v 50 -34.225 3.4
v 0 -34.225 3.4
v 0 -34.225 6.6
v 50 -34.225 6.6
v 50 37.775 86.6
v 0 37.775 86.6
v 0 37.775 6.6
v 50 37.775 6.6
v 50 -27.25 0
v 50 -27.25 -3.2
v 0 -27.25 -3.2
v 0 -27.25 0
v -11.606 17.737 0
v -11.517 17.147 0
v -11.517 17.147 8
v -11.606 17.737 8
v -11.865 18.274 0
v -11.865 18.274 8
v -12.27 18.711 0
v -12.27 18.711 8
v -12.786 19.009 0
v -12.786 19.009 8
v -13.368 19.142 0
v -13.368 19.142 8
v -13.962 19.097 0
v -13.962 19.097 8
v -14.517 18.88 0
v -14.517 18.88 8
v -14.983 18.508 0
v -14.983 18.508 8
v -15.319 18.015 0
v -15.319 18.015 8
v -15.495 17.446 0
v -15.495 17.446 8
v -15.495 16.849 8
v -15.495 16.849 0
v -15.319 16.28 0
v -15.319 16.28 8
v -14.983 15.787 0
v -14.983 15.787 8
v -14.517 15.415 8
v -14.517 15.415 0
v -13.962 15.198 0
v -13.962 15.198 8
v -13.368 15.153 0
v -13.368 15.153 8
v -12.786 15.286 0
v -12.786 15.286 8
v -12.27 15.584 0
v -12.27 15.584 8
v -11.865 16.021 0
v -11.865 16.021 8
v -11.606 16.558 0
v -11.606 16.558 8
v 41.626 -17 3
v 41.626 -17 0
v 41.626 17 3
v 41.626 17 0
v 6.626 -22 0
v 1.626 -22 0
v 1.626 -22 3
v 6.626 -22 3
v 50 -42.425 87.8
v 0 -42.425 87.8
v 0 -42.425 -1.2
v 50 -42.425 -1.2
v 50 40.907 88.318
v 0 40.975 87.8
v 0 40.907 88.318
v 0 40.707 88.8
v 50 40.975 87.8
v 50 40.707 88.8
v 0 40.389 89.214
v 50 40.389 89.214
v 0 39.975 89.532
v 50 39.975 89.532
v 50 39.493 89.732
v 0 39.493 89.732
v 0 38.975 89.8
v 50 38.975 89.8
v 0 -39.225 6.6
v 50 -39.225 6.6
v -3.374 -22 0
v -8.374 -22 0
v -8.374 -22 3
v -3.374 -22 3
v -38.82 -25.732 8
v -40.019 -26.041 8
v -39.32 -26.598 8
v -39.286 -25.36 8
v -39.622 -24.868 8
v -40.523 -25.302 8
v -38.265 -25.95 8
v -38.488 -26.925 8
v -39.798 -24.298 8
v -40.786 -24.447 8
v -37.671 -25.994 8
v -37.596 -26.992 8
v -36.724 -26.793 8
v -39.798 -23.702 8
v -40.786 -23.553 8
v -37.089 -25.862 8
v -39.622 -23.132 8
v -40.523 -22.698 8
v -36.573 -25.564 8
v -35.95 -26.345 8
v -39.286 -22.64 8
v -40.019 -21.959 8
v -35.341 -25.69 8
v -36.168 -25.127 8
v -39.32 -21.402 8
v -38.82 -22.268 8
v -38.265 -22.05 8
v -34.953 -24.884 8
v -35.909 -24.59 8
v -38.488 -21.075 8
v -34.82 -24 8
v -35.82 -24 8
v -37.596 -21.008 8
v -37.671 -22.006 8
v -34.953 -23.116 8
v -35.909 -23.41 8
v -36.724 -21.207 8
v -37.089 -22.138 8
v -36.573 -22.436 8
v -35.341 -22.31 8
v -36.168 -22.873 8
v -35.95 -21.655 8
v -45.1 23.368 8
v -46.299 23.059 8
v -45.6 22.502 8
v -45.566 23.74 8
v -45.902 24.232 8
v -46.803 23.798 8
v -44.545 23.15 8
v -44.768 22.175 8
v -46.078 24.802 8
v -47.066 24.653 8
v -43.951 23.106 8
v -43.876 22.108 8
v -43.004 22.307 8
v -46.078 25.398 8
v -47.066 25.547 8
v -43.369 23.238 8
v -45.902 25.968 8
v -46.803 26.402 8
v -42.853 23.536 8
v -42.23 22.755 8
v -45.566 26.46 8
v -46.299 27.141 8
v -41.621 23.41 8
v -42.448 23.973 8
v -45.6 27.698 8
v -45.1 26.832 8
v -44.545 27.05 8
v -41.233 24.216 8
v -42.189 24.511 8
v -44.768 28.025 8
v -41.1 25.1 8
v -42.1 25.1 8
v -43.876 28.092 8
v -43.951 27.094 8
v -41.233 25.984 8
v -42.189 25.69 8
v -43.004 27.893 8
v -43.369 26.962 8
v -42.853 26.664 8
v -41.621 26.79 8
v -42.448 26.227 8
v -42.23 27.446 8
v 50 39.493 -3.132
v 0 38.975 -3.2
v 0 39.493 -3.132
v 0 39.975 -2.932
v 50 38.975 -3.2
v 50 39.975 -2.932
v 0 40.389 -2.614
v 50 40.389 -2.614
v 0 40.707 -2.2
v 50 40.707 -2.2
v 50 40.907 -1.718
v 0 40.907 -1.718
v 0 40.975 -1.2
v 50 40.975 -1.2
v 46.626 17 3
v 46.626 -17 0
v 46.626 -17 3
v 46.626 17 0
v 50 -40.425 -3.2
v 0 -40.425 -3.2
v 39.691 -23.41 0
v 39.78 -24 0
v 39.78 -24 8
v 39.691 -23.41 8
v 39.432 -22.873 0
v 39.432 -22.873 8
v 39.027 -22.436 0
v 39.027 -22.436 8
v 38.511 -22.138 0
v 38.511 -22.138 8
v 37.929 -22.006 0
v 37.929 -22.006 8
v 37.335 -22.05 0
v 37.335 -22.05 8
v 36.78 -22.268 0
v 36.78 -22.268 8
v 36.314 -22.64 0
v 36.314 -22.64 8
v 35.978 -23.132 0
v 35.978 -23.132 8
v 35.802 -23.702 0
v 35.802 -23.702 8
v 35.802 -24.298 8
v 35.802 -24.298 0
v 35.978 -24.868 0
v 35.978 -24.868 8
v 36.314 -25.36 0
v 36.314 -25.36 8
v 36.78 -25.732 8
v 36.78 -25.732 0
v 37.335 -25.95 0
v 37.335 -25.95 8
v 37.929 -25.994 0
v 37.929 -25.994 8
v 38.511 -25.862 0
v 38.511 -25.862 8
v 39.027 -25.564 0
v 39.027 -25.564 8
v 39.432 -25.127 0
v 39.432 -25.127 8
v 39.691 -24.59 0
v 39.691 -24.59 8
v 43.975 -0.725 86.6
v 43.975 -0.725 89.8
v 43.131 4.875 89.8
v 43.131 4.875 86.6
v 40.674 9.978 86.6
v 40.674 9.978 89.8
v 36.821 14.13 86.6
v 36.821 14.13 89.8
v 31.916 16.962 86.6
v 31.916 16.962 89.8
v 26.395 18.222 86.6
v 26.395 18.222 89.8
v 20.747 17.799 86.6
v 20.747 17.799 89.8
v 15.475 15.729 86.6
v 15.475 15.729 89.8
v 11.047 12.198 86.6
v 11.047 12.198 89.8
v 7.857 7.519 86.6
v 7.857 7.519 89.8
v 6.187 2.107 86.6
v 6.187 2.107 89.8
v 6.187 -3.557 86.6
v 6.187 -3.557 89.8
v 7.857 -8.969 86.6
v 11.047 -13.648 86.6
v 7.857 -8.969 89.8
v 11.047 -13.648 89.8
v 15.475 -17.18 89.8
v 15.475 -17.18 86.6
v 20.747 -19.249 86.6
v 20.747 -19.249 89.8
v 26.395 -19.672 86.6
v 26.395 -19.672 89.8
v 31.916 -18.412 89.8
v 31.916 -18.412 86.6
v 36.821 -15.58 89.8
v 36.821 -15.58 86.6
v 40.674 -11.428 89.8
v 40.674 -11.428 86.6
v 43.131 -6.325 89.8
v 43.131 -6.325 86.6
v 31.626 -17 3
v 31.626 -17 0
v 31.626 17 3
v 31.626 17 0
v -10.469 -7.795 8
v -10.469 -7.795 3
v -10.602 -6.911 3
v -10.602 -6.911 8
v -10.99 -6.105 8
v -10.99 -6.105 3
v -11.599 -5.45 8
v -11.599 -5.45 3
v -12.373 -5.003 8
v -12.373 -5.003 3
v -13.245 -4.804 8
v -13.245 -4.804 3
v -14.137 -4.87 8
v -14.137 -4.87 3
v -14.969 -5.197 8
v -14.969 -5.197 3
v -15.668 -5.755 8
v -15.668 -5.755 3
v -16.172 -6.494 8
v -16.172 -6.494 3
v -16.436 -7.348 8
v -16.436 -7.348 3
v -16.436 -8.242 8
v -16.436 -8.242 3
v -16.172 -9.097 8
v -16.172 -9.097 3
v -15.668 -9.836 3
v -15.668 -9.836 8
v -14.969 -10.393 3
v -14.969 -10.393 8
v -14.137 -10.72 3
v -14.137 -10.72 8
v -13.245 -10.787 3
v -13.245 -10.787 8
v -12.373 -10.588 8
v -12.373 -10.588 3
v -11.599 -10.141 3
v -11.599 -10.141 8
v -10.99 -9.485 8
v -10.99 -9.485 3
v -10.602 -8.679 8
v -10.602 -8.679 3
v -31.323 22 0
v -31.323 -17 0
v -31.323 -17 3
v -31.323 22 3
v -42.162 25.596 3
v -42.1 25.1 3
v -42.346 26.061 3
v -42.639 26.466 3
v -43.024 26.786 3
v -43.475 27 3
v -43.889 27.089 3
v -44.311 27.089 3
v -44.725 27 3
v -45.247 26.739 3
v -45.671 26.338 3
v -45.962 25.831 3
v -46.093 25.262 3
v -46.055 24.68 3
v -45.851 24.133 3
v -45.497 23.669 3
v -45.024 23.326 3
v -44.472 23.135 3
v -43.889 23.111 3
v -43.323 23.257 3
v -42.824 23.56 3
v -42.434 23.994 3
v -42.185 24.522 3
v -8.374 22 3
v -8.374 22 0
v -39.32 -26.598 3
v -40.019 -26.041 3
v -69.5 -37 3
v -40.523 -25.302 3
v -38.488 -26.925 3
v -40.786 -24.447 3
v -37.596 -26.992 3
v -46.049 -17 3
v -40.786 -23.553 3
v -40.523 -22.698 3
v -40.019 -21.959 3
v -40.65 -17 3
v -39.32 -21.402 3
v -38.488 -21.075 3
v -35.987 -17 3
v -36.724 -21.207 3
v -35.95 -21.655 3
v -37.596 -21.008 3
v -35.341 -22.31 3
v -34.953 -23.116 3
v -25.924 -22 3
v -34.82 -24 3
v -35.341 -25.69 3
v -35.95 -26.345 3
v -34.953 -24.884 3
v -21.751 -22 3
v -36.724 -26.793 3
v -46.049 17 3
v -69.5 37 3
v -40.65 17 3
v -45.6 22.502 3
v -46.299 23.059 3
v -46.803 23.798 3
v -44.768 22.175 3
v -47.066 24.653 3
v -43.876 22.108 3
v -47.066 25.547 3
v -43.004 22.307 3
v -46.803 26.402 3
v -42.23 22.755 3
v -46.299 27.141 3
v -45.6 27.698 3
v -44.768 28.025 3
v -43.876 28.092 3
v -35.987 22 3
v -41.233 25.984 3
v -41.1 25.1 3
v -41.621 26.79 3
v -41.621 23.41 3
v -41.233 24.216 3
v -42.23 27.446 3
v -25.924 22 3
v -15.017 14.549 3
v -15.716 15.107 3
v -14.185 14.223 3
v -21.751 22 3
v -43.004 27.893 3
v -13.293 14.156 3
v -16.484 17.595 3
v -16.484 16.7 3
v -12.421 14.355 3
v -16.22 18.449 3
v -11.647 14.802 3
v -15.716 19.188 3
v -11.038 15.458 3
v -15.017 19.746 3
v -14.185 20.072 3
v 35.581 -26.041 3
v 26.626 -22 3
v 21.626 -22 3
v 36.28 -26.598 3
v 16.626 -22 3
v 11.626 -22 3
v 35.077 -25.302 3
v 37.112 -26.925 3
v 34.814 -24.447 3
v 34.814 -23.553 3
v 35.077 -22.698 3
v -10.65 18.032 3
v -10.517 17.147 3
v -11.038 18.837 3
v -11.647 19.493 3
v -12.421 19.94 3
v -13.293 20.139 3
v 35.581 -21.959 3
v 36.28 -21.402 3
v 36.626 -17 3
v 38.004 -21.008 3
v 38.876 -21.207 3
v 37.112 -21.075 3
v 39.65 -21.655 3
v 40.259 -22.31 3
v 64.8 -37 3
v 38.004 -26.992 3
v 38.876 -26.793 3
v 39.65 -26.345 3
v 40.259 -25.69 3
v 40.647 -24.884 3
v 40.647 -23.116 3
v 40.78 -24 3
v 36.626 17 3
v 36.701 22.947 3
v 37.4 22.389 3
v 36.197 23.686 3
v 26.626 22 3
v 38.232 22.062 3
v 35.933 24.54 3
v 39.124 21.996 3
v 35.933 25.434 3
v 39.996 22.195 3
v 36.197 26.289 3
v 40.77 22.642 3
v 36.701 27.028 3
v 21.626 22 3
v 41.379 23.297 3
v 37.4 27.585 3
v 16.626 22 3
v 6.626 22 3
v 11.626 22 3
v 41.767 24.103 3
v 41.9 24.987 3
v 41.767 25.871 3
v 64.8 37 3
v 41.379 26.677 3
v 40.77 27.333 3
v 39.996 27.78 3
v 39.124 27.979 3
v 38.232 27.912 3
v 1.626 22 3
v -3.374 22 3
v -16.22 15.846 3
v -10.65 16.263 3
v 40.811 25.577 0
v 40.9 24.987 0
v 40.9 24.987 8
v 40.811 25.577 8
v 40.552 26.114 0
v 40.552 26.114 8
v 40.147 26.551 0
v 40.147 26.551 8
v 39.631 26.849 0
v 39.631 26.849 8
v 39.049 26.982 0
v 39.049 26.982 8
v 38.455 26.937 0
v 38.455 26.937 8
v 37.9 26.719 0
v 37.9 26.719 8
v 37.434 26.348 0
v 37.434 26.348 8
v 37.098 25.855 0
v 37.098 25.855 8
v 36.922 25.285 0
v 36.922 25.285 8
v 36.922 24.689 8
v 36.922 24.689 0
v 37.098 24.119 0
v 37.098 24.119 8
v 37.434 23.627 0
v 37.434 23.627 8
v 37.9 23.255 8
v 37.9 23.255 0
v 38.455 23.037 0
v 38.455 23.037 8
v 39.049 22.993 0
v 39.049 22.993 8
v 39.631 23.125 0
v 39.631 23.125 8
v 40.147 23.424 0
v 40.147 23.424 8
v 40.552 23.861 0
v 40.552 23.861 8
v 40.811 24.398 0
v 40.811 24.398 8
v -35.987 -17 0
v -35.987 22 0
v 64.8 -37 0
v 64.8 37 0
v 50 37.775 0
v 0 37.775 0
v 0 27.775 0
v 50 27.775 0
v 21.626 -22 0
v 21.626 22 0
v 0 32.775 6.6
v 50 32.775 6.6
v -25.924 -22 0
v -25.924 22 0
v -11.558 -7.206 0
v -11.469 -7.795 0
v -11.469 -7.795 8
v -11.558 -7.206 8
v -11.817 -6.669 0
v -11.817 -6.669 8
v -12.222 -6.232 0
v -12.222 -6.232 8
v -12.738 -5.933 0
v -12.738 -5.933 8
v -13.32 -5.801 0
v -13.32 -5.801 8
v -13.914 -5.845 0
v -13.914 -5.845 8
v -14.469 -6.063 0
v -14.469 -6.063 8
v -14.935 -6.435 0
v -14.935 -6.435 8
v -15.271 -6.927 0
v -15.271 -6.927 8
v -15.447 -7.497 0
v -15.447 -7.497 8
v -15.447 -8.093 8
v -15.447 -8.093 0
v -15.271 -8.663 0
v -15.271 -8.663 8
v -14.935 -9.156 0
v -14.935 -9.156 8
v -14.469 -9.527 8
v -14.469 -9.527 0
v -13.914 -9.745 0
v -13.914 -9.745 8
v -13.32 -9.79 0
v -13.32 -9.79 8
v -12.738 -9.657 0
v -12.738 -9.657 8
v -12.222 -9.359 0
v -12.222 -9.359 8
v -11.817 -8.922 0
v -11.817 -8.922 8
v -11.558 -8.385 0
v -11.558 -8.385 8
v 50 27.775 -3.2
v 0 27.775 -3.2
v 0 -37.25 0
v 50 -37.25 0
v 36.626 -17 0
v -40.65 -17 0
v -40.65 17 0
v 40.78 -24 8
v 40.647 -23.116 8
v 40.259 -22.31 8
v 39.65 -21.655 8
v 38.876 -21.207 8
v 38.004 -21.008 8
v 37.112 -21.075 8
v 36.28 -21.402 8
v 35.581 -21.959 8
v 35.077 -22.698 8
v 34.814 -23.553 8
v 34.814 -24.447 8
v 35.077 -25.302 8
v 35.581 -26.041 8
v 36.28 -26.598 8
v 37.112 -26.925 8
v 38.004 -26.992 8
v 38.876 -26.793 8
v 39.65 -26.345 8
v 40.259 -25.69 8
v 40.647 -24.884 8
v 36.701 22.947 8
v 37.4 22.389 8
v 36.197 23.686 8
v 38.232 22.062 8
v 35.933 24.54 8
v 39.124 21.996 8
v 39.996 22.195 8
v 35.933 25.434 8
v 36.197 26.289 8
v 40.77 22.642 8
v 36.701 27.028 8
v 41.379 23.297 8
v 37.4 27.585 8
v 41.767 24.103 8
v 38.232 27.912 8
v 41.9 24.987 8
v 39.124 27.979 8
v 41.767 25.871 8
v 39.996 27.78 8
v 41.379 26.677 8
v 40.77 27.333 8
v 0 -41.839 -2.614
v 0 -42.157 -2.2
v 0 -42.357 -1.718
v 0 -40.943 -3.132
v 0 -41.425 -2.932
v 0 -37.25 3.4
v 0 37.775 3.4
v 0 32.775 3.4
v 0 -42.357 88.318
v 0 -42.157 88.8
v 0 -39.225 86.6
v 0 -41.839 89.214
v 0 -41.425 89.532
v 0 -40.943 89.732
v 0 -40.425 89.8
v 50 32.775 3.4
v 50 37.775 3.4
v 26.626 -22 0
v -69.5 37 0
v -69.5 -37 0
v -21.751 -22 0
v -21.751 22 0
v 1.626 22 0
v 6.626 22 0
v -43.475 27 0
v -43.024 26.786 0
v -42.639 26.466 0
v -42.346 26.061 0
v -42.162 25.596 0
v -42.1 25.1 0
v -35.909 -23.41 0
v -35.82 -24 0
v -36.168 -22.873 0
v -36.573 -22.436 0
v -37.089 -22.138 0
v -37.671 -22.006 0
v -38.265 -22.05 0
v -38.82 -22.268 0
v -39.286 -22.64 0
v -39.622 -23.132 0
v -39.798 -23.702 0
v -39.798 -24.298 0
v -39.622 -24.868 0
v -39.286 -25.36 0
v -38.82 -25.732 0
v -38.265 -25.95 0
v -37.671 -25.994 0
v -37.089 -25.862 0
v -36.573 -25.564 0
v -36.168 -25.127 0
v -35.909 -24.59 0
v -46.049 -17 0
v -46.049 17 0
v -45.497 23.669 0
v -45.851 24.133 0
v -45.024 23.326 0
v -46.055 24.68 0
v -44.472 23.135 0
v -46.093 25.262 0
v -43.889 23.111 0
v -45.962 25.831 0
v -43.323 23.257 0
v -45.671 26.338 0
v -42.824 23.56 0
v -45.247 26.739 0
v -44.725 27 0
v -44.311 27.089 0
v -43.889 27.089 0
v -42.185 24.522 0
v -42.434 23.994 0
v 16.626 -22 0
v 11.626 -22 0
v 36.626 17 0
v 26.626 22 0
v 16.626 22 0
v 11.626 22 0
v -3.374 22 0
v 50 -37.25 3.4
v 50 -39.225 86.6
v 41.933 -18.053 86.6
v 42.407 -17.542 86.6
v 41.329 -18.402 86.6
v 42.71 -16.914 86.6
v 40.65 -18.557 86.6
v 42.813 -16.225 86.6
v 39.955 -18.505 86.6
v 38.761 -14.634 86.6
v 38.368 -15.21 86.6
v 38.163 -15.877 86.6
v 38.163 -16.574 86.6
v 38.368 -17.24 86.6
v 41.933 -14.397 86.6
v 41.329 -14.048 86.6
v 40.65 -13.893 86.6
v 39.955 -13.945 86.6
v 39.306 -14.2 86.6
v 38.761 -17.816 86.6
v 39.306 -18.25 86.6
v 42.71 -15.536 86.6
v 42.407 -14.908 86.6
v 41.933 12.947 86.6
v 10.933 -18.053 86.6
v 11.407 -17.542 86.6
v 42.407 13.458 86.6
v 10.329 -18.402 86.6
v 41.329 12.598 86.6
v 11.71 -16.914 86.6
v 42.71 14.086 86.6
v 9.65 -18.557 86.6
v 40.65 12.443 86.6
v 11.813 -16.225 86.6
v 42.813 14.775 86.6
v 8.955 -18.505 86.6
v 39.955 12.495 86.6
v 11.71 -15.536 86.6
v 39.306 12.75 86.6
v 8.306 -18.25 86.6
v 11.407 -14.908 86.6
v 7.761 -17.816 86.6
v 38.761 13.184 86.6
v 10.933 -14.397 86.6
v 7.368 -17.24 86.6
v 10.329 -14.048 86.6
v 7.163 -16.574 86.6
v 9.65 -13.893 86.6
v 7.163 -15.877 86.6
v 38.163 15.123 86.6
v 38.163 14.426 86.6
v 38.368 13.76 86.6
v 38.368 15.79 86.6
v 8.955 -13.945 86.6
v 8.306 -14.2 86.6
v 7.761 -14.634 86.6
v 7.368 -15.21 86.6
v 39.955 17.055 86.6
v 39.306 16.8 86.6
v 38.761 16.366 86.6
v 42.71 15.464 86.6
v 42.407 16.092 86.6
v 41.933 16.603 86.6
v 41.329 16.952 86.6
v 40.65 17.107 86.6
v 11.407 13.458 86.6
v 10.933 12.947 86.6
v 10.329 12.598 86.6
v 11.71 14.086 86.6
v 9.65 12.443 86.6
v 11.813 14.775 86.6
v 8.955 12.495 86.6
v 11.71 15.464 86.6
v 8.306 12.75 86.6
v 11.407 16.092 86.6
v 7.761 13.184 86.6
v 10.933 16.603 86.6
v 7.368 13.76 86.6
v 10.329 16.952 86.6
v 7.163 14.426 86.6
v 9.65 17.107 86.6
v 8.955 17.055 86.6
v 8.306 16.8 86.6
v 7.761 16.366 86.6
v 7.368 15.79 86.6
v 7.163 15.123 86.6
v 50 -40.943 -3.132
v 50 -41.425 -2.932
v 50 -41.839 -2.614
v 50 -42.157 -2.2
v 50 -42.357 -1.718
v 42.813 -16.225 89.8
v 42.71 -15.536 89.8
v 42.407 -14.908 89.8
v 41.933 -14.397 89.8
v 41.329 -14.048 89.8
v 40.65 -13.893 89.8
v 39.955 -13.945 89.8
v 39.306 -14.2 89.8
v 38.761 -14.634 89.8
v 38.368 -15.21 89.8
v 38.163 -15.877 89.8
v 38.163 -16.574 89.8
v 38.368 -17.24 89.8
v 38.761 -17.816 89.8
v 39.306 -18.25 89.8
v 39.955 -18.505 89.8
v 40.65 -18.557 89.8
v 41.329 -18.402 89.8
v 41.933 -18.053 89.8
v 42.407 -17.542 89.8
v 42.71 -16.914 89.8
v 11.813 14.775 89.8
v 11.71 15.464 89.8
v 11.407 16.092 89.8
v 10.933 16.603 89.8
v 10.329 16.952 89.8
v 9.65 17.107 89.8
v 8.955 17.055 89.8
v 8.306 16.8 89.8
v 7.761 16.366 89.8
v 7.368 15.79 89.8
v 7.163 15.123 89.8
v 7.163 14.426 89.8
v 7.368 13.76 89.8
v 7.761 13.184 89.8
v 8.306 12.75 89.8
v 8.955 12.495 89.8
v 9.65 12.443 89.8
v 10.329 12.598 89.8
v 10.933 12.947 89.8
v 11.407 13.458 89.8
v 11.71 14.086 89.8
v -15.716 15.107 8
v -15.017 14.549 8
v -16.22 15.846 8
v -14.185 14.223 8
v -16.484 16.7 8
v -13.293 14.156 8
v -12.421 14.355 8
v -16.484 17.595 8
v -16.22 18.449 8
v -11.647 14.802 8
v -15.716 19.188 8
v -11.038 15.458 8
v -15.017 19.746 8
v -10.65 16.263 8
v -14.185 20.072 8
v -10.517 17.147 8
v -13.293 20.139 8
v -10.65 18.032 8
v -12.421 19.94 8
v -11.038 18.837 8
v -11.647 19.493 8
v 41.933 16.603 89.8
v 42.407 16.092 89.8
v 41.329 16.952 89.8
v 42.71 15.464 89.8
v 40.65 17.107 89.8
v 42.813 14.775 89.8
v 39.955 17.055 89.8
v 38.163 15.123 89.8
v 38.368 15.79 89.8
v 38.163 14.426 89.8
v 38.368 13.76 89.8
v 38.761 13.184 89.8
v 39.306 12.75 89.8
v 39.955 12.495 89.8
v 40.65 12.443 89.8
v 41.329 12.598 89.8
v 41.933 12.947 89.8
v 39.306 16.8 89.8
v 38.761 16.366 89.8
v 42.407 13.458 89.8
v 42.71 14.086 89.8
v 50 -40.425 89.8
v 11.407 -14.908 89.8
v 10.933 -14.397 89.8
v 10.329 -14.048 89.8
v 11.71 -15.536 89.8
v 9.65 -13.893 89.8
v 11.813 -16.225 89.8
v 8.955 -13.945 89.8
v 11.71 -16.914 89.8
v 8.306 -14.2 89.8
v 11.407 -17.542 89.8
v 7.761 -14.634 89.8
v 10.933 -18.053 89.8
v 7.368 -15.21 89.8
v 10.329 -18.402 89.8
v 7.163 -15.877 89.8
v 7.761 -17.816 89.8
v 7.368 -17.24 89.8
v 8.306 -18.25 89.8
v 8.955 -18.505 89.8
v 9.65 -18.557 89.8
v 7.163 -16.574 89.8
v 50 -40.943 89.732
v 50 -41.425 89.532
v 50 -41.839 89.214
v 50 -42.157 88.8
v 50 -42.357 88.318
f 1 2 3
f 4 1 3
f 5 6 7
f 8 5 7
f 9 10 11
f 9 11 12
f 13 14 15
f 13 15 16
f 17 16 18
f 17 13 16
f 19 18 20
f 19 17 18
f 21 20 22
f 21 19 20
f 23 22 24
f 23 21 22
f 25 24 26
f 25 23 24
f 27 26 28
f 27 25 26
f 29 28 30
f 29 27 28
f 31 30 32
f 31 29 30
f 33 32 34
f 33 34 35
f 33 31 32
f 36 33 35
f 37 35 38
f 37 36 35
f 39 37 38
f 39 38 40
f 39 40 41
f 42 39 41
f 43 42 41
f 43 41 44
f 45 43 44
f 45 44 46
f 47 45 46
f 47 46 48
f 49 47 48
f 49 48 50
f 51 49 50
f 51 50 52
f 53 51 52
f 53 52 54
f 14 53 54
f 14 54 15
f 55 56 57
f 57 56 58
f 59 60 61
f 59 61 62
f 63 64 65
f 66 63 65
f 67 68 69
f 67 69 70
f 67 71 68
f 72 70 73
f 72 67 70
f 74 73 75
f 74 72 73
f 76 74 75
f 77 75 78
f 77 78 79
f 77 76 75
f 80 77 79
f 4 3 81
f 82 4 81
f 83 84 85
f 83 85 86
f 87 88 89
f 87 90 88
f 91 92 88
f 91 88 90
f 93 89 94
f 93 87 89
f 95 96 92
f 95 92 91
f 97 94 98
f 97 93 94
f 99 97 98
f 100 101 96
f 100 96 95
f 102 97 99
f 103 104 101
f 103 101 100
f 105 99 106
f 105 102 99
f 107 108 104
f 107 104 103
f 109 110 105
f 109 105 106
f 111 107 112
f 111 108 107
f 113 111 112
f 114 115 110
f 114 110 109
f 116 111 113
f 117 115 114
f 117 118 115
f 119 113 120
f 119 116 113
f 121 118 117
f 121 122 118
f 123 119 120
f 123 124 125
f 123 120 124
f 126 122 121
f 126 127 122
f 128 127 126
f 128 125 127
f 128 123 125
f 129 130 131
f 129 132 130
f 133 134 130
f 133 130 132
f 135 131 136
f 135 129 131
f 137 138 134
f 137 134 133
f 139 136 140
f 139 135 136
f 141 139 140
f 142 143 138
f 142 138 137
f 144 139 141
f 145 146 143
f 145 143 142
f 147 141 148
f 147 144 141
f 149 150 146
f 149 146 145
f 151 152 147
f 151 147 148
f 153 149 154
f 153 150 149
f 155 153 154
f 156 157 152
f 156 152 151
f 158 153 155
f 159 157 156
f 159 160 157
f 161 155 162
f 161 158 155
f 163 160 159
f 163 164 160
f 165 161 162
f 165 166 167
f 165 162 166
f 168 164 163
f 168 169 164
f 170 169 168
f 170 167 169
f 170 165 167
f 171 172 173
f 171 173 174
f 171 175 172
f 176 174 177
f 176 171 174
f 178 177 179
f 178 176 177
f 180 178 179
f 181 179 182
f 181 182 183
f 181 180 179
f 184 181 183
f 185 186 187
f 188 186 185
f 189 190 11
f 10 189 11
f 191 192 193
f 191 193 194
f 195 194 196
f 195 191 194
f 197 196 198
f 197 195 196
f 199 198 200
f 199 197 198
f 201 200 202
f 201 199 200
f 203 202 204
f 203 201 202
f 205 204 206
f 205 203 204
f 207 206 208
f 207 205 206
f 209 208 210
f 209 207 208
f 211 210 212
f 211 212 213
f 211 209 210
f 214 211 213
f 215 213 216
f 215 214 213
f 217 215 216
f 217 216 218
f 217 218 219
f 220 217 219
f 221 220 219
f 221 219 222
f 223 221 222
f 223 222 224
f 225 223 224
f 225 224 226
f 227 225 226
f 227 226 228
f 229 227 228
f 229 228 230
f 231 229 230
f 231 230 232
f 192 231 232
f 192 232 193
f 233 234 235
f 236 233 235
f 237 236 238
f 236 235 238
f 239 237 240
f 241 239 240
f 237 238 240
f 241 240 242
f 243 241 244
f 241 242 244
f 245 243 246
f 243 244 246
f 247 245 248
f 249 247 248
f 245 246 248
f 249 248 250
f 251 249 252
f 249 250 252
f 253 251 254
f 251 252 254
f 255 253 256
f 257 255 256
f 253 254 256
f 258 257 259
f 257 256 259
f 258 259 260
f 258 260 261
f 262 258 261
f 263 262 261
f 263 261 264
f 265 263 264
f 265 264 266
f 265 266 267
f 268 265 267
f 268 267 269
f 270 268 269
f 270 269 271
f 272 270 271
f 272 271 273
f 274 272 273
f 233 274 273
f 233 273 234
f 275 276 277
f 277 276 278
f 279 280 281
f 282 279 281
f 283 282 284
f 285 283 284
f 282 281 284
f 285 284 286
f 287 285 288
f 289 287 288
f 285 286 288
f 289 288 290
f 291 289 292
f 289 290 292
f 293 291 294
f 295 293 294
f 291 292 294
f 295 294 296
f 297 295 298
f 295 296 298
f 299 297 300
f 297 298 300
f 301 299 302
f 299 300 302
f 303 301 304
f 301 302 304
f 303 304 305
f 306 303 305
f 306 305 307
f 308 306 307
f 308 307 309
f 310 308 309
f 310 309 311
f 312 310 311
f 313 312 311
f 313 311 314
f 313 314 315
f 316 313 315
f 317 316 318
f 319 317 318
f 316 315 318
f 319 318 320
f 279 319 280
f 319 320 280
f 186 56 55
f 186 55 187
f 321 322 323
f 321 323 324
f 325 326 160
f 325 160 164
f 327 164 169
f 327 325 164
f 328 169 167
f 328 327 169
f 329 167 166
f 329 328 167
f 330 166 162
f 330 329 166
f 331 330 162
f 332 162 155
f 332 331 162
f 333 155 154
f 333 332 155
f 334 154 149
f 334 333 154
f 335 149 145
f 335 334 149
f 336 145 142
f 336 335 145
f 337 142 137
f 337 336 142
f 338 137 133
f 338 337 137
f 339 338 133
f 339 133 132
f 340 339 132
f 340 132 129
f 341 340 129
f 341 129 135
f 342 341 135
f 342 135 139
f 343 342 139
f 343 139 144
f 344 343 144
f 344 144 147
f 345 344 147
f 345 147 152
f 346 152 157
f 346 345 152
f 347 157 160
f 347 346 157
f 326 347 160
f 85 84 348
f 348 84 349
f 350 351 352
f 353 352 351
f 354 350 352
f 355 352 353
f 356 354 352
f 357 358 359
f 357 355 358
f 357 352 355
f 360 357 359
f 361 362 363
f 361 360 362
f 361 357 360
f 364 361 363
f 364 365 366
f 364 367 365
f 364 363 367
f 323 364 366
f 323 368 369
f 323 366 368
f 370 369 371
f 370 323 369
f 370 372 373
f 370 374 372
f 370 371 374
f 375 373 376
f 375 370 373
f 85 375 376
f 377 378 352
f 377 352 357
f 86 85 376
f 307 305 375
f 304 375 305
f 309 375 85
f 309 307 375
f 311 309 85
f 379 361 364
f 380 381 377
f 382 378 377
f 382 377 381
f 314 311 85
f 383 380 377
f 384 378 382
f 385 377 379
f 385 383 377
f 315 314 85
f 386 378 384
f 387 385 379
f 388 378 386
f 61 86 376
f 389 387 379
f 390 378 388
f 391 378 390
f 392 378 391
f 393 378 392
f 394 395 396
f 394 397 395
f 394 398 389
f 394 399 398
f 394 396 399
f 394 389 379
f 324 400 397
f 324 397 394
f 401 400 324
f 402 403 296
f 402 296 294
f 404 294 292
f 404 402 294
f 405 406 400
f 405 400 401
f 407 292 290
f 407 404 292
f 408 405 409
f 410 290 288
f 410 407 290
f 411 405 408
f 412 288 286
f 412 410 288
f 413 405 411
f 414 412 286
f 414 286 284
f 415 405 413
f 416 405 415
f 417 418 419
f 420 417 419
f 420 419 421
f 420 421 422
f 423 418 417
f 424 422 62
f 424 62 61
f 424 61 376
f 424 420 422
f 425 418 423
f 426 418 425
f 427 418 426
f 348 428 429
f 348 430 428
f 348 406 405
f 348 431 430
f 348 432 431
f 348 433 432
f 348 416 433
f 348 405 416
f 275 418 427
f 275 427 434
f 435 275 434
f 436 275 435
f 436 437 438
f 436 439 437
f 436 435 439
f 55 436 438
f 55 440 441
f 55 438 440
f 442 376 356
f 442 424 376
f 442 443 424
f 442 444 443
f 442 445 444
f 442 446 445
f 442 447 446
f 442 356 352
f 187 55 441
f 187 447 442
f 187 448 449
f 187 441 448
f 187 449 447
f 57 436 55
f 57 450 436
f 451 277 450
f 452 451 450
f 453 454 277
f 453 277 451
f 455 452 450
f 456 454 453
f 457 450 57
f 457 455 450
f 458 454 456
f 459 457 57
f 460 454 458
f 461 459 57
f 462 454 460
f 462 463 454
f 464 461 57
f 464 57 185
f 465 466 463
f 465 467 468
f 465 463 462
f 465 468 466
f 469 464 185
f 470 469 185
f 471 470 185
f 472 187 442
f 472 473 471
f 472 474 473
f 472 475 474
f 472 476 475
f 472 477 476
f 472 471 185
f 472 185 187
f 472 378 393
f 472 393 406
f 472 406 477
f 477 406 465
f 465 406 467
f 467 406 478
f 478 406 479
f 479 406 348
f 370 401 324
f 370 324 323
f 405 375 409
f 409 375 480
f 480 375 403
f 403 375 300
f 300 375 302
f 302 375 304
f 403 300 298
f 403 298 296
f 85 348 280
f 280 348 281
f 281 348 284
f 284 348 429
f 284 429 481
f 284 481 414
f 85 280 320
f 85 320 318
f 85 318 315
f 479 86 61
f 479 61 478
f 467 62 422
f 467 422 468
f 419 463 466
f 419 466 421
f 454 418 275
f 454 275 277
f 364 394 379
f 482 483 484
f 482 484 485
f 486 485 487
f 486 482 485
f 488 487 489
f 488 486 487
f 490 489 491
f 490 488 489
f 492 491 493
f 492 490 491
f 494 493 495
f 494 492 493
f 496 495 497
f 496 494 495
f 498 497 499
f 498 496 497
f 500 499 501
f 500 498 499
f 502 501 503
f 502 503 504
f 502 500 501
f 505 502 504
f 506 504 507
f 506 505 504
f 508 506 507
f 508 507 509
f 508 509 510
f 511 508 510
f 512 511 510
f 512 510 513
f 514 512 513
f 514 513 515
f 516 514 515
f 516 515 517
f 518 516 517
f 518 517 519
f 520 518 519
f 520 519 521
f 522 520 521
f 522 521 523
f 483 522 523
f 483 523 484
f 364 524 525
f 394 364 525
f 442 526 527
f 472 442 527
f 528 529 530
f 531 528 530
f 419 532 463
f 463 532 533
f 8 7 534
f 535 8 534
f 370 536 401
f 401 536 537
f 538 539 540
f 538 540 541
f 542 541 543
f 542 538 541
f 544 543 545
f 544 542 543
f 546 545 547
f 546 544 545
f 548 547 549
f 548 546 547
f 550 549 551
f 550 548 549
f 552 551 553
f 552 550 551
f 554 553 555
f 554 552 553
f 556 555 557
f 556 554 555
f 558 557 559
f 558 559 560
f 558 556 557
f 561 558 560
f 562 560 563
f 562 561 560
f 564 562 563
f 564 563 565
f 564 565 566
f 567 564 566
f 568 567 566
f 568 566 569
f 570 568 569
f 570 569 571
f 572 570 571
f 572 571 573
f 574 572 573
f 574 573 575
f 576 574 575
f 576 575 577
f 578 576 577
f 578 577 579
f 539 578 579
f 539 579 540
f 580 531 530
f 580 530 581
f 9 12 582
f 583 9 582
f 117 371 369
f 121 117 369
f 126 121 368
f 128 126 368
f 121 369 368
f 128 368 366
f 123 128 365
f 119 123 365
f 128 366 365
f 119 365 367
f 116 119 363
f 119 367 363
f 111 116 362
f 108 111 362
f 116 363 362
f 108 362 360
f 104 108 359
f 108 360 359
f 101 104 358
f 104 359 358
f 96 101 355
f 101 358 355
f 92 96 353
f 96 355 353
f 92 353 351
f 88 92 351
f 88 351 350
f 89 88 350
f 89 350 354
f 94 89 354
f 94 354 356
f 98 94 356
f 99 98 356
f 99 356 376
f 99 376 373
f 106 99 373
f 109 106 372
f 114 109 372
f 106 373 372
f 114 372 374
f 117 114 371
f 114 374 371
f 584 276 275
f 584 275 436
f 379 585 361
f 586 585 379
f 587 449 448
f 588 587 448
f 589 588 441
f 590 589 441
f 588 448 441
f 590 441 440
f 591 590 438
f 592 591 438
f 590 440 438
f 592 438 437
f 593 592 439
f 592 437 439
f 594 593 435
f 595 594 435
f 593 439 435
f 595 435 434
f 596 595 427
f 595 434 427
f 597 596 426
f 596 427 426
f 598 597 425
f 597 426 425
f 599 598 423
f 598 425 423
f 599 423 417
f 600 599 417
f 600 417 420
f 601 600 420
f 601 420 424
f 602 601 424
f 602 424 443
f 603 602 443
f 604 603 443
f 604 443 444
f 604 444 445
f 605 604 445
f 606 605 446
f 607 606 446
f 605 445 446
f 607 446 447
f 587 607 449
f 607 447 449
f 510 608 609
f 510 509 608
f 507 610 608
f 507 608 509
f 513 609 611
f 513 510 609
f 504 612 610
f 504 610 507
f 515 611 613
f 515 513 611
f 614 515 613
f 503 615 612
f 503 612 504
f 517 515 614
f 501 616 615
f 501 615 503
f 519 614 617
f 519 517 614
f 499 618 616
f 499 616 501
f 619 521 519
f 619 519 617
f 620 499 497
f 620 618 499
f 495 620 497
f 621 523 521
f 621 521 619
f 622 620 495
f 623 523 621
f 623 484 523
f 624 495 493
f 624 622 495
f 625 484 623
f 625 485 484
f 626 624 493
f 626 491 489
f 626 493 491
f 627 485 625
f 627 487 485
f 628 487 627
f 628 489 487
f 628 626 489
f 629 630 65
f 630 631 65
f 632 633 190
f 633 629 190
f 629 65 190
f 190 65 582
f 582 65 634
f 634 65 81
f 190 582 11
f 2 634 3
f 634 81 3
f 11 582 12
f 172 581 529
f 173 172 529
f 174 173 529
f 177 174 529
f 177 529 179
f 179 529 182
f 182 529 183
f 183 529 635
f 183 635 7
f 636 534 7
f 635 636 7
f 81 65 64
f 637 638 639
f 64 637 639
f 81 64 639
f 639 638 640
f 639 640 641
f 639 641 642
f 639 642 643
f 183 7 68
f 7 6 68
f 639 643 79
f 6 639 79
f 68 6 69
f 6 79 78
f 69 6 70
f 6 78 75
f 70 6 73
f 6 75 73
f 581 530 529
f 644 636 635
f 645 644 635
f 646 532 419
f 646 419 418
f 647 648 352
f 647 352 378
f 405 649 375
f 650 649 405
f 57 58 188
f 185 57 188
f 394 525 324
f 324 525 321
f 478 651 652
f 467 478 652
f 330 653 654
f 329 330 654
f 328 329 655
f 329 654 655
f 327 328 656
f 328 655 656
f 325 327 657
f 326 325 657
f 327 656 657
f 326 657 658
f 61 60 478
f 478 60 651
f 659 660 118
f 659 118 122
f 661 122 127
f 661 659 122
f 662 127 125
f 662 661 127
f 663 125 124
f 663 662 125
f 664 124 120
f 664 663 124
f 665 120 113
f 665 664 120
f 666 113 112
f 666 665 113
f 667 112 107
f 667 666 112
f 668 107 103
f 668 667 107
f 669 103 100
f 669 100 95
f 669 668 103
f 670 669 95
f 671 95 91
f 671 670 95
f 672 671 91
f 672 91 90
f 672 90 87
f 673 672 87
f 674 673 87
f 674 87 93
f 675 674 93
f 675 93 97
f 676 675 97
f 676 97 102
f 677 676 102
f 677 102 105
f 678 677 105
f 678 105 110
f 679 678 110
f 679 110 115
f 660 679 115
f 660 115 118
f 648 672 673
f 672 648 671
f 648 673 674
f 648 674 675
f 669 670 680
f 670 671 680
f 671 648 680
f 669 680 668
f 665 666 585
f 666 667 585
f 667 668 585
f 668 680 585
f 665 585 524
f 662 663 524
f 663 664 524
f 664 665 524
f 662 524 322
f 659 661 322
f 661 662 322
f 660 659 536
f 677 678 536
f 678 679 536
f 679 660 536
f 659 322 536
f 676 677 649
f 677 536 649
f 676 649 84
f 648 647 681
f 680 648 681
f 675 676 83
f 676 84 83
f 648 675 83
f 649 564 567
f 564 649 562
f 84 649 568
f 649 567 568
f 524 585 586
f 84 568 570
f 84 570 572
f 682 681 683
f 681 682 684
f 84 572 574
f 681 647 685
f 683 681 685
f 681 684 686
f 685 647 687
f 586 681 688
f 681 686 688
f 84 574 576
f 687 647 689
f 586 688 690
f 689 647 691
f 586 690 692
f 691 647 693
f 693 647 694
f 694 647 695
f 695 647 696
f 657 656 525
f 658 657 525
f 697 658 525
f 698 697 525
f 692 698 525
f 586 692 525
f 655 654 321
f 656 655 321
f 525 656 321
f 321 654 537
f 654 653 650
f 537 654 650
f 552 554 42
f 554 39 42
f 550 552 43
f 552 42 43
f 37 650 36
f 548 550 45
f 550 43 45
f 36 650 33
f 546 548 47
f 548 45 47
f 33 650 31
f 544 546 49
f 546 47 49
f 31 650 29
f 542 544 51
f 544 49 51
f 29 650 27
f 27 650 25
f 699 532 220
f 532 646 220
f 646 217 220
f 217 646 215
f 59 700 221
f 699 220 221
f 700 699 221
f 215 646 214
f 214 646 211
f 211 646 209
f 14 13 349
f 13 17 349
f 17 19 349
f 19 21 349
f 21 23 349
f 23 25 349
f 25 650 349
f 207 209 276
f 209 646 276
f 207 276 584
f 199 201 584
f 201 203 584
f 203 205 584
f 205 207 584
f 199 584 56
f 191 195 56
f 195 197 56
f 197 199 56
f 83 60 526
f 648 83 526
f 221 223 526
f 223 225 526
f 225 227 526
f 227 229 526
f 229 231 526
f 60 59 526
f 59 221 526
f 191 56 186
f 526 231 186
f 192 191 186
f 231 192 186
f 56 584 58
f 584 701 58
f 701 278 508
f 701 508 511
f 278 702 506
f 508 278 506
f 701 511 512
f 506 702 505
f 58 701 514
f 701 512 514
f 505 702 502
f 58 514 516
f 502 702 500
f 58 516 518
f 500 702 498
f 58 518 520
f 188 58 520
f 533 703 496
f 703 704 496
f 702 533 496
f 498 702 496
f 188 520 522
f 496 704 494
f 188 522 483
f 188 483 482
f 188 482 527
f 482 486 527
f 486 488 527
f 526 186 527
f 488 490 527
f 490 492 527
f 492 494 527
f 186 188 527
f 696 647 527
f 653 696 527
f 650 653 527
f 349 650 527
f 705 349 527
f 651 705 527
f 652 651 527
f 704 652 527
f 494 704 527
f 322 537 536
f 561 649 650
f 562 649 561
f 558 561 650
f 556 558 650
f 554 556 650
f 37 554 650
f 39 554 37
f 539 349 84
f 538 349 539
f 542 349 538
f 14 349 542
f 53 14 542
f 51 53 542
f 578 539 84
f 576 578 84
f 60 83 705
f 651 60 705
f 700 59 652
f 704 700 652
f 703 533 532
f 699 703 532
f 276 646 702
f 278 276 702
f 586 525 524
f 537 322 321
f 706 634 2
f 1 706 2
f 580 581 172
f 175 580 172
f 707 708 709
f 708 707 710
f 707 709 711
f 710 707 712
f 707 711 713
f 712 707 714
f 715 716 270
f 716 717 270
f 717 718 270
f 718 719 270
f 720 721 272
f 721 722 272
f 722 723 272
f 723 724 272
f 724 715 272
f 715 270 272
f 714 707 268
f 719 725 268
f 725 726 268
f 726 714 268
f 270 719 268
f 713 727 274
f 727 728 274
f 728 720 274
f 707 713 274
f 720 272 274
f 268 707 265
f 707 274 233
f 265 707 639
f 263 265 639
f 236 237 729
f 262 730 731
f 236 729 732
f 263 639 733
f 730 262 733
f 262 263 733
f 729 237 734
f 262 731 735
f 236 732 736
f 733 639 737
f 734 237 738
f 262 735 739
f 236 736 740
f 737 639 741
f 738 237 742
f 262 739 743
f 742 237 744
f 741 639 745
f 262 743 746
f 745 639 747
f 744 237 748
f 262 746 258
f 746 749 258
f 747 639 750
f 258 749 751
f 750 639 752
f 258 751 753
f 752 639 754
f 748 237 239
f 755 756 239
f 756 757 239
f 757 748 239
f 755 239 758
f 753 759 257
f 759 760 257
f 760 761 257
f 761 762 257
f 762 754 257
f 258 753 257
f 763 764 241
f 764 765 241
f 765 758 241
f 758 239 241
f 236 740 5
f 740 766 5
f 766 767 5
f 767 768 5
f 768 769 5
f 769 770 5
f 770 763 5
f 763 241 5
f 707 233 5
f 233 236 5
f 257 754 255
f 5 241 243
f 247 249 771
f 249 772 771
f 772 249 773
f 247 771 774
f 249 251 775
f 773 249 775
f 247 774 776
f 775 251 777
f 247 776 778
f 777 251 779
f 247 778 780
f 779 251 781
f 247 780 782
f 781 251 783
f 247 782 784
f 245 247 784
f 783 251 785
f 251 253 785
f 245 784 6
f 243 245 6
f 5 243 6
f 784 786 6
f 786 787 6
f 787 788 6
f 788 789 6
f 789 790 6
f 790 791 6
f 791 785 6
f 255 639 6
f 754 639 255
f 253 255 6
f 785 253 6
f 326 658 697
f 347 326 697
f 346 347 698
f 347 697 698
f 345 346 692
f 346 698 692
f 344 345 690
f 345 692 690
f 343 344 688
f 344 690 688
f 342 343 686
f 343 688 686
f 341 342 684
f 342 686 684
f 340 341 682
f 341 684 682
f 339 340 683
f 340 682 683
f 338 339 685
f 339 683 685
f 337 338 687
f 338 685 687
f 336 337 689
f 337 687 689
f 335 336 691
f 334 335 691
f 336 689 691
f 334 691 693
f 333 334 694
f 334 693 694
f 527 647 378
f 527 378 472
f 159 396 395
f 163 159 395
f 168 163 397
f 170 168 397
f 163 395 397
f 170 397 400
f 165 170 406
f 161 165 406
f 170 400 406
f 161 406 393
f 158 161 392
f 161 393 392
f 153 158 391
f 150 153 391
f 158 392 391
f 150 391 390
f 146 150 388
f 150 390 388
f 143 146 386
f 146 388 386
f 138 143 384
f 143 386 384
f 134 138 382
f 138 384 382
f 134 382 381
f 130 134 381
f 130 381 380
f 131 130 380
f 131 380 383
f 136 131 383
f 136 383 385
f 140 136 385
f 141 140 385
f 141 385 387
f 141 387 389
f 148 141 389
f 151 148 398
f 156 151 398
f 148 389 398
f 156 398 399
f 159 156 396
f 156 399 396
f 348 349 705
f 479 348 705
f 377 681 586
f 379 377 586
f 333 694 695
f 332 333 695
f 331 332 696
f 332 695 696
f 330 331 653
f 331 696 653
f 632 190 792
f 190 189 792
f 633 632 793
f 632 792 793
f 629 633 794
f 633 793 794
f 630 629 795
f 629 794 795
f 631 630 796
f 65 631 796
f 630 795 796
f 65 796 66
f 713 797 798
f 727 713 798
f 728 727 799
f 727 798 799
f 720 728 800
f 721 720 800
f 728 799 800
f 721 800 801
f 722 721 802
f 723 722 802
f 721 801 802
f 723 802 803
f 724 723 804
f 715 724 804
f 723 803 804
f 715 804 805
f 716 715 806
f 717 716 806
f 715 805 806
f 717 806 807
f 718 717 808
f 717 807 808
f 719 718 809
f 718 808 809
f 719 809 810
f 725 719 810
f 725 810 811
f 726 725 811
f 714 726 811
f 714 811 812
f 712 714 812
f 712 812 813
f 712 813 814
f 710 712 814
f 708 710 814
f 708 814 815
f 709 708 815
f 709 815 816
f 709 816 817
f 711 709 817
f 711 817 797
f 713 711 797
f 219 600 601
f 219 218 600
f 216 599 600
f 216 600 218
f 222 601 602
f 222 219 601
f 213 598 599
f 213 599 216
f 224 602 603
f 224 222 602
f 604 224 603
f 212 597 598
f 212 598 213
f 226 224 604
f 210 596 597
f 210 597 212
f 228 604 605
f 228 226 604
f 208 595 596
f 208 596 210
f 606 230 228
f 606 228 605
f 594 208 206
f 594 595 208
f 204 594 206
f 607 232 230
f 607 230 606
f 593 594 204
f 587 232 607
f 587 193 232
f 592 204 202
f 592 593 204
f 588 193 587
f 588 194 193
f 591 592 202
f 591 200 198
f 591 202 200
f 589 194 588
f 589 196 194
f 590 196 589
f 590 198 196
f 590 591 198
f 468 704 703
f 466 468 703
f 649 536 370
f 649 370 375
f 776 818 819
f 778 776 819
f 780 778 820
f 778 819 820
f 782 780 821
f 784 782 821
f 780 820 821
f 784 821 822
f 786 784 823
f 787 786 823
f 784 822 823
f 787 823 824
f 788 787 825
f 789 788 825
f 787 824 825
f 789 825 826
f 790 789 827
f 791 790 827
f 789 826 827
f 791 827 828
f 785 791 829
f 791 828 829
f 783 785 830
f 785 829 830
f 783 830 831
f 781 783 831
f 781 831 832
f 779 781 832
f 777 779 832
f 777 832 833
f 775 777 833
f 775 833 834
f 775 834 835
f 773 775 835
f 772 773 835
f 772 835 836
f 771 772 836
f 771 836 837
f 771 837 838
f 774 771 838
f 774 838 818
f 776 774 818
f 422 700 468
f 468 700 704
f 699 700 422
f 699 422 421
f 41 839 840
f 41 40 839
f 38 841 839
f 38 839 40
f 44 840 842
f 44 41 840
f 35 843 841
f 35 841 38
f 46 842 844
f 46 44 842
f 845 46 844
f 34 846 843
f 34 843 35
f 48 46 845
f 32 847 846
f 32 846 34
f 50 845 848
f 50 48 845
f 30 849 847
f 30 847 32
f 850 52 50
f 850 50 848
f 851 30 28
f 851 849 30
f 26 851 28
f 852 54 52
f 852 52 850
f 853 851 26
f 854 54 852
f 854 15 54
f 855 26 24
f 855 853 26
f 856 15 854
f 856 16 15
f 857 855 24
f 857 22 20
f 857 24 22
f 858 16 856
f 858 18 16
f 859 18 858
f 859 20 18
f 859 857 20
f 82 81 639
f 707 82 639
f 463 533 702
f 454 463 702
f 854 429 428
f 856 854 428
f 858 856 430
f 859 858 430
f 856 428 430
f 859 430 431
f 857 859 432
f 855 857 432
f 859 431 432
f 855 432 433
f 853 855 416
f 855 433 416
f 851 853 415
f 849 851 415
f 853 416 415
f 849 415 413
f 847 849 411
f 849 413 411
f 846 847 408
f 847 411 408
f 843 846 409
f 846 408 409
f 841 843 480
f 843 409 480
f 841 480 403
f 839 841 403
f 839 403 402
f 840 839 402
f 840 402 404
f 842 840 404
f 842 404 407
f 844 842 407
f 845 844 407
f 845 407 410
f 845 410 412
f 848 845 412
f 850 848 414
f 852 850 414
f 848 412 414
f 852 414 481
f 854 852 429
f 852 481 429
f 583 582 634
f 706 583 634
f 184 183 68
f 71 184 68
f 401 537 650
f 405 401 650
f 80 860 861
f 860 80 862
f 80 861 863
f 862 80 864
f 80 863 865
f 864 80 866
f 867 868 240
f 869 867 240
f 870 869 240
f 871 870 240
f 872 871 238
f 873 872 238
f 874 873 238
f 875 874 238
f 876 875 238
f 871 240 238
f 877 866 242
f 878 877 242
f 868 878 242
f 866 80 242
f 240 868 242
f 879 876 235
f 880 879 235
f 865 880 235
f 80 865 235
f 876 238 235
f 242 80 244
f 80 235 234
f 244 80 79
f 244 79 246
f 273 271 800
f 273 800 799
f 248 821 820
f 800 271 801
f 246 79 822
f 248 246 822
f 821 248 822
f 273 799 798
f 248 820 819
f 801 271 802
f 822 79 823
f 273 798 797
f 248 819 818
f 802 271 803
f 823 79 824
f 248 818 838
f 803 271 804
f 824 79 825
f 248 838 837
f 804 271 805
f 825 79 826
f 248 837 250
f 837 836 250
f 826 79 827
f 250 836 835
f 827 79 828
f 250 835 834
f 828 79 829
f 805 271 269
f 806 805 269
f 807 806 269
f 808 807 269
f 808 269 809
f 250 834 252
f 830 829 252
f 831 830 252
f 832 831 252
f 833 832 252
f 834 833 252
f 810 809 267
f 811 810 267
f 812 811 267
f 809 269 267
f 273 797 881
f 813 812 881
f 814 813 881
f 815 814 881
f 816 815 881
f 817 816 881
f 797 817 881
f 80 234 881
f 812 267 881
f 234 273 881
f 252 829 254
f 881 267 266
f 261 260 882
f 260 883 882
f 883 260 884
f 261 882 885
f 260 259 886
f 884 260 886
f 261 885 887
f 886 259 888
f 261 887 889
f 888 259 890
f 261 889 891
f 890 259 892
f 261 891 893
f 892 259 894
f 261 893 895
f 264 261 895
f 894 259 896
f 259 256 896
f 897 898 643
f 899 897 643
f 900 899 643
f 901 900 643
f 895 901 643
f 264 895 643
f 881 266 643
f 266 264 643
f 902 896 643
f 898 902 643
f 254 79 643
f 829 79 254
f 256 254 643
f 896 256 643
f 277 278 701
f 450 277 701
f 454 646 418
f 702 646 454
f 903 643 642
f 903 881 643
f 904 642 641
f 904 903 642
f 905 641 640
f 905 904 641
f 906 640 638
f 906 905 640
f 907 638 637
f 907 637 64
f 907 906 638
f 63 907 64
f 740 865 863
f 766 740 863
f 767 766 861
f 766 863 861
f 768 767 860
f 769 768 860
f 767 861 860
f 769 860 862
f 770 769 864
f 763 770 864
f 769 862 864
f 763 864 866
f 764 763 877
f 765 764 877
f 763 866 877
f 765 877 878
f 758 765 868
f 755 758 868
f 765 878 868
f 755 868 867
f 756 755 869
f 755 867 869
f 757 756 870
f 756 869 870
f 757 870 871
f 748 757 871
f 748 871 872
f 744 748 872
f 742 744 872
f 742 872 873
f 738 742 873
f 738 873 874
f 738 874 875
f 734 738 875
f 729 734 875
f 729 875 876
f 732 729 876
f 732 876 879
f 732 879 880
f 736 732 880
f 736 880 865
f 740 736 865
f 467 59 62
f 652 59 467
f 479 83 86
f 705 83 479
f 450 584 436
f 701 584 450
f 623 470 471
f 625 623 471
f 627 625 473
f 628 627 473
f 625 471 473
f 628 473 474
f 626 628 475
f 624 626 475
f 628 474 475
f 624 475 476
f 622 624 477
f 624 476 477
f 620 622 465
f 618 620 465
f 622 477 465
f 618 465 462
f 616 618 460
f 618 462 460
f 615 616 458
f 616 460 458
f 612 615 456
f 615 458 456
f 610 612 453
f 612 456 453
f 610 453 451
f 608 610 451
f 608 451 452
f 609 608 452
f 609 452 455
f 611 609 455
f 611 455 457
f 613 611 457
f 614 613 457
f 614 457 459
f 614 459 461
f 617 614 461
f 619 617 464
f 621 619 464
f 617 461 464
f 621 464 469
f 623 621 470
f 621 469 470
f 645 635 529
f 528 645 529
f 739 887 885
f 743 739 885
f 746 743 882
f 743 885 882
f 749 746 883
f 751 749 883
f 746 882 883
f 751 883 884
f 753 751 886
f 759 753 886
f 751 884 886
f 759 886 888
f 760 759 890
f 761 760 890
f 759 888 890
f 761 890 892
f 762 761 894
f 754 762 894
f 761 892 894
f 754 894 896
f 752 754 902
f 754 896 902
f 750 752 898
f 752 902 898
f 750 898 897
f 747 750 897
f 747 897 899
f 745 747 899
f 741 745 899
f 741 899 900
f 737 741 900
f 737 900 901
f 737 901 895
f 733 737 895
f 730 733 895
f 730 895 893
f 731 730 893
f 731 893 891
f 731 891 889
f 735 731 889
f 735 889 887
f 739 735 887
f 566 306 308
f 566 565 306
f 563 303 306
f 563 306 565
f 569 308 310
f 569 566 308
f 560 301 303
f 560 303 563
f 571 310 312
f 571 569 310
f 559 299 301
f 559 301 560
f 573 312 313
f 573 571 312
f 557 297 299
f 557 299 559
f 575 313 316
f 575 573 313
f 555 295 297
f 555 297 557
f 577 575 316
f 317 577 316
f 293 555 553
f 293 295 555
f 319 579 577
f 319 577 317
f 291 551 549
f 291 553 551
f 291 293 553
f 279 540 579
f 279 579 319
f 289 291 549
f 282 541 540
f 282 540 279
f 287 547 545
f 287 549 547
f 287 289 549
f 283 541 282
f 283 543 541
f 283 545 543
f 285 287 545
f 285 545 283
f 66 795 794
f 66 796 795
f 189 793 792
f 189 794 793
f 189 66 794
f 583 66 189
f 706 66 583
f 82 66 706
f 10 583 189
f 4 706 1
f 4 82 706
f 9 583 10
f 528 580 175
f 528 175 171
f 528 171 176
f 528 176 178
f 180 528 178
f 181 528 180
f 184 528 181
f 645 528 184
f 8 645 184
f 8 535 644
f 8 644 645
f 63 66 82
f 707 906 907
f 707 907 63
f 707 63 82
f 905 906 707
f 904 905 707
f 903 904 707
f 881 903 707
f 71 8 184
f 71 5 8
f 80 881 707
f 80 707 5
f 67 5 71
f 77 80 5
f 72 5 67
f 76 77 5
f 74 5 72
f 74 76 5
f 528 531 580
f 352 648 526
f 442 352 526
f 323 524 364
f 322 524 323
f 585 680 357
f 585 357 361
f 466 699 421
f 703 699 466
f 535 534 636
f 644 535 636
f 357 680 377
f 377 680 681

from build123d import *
from build123d import SkipClean  # not in build123d's __all__

# Parameters (mm, degrees)
F0_W      = 134.3
F0_H      = 74
F0_R      = 2
F1_DEPTH  = 3
F2_DEPTH  = 25
F3_R      = 3
F3_R_2    = 2
F4_DEPTH  = 5
F7_W      = 5
F7_H      = 34
F7_H_2    = 44
F7_W_2    = 4.1724147481
F7_W_3    = 4.6632857585
F7_H_3    = 39
F7_W_4    = 5.3995953176
F8_DEPTH  = 25
F10_DEPTH = 50
F11_R     = 2.3384592634
F11_R_2   = 19
F12_DEPTH = 25
F13_R     = 2


# Not quite as in the source:
# - after a boolean that leaves OpenCascade's solid faulty, fix() repairs it
# - a feature names something its author has since deleted; it is built from what else it names


with BuildPart() as f1:
    # F0 (on Top) → F1 (new body)
    with BuildSketch(Plane.XY):
        with Locations((-2.35, 0)):
            Rectangle(F0_W, F0_H)
        with BuildLine():
            Line((-49.5, 22.5), (-46.5, 27))
            Line((-46.5, 27), (-44.7245493689, 27))
            ThreePointArc((-44.7245493689, 27), (-44.1, 27.1000162933), (-43.4754506311, 27))
            Line((-43.4754506311, 27), (48, 27))
            Line((48, 27), (48, 23.31))
            Line((48, 23.31), (49.6, 23.31))
            Line((49.6, 23.31), (49.6, 14.31))
            Line((49.6, 14.31), (48, 14.31))
            Line((48, 14.31), (48, -5.37))
            Line((48, -5.37), (54.8, -5.37))
            Line((54.8, -5.37), (54.8, -17.5))
            Line((54.8, -17.5), (48, -17.5))
            Line((48, -17.5), (48, -27))
            Line((48, -27), (-46.75, -27))
            Line((-46.75, -27), (-46.75, -14.5))
            Line((-46.75, -14.5), (-49.5, -14.5))
            Line((-49.5, -14.5), (-49.5, 22.5))
        make_face(mode=Mode.SUBTRACT)
        with BuildLine():
            Line((-44.7245493689, 27), (-46.5, 27))
            Line((-46.5, 27), (-49.5, 22.5))
            Line((-49.5, 22.5), (-49.5, -14.5))
            Line((-49.5, -14.5), (-46.75, -14.5))
            Line((-46.75, -14.5), (-46.75, -27))
            Line((-46.75, -27), (48, -27))
            Line((48, -27), (48, -17.5))
            Line((48, -17.5), (54.8, -17.5))
            Line((54.8, -17.5), (54.8, -5.37))
            Line((54.8, -5.37), (48, -5.37))
            Line((48, -5.37), (48, 14.31))
            Line((48, 14.31), (49.6, 14.31))
            Line((49.6, 14.31), (49.6, 23.31))
            Line((49.6, 23.31), (48, 23.31))
            Line((48, 23.31), (48, 27))
            Line((48, 27), (-43.4754506311, 27))
            ThreePointArc((-43.4754506311, 27), (-42.4799538991, 26.2728123672), (-42.1, 25.1000162933))
            ThreePointArc((-42.1, 25.1000162933), (-45.272796074, 23.4799701924), (-44.7245493689, 27))
        make_face()
        with Locations((-37.82, -24)):
            Circle(F0_R, mode=Mode.SUBTRACT)
        with Locations((-13.4690740741, -7.7952196389)):
            Circle(F0_R, mode=Mode.SUBTRACT)
        with Locations((37.78, -24)):
            Circle(F0_R, mode=Mode.SUBTRACT)
        with Locations((-13.5170461553, 17.1474736725)):
            Circle(F0_R, mode=Mode.SUBTRACT)
        with Locations((38.8999233283, 24.9872000806)):
            Circle(F0_R, mode=Mode.SUBTRACT)
    extrude(amount=F1_DEPTH)

    # F0 (on Top) → F2 (cut)
    with BuildSketch(Plane.XY):
        with BuildLine():
            ThreePointArc((-43.4754506311, 27), (-44.1, 27.1000162933), (-44.7245493689, 27))
            Line((-44.7245493689, 27), (-43.4754506311, 27))
        make_face()
        with BuildLine():
            Line((-43.4754506311, 27), (-44.7245493689, 27))
            ThreePointArc((-44.7245493689, 27), (-45.272796074, 23.4799701924), (-42.1, 25.1000162933))
            ThreePointArc((-42.1, 25.1000162933), (-42.4799538991, 26.2728123672), (-43.4754506311, 27))
        make_face()
        with Locations((-13.5170461553, 17.1474736725)):
            Circle(F0_R)
        with Locations((38.8999233283, 24.9872000806)):
            Circle(F0_R)
        with Locations((-13.4690740741, -7.7952196389)):
            Circle(F0_R)
        with Locations((-37.82, -24)):
            Circle(F0_R)
        with Locations((37.78, -24)):
            Circle(F0_R)
    extrude(amount=F2_DEPTH, mode=Mode.SUBTRACT)

    # F3 (on face) → F4 (join)
    with BuildSketch(Plane.XY.offset(3)):
        with Locations((-44.1, 25.1000162933)):
            Circle(F3_R)
        with Locations((-44.1, 25.1000162933)):
            Circle(F3_R_2, mode=Mode.SUBTRACT)
        with Locations((-13.5170461553, 17.1474736725)):
            Circle(F3_R)
        with Locations((-13.5170461553, 17.1474736725)):
            Circle(F3_R_2, mode=Mode.SUBTRACT)
        with Locations((38.8999233283, 24.9872000806)):
            Circle(F3_R)
        with Locations((38.8999233283, 24.9872000806)):
            Circle(F3_R_2, mode=Mode.SUBTRACT)
        with Locations((-13.4690740741, -7.7952196389)):
            Circle(F3_R)
        with Locations((-13.4690740741, -7.7952196389)):
            Circle(F3_R_2, mode=Mode.SUBTRACT)
        with Locations((-37.82, -24)):
            Circle(F3_R)
        with Locations((-37.82, -24)):
            Circle(F3_R_2, mode=Mode.SUBTRACT)
        with Locations((37.78, -24)):
            Circle(F3_R)
        with Locations((37.78, -24)):
            Circle(F3_R_2, mode=Mode.SUBTRACT)
    with SkipClean():  # cleaning this boolean's faces spoils the solid; the shape is the same uncleaned
        extrude(amount=F4_DEPTH)

    # F7 (on face) → F8 (cut)
    with BuildSketch(Plane.XY):
        with Locations((44.1262373328, 0)):
            Rectangle(F7_W, F7_H)
        with Locations((24.1262373328, 0)):
            Rectangle(F7_W, F7_H_2)
        with Locations((14.1262373328, 0)):
            Rectangle(F7_W, F7_H_2)
        with Locations((4.1262373328, 0)):
            Rectangle(F7_W, F7_H_2)
        with Locations((-5.8737626672, 0)):
            Rectangle(F7_W, F7_H_2)
        with Locations((-23.837414466, 0)):
            Rectangle(F7_W_2, F7_H_2)
        with Locations((-33.654858008, 2.5)):
            Rectangle(F7_W_3, F7_H_3)
        with Locations((-43.3495822757, 0)):
            Rectangle(F7_W_4, F7_H)
        with Locations((34.1262373328, 0)):
            Rectangle(F7_W, F7_H)
    extrude(amount=F8_DEPTH, mode=Mode.SUBTRACT)

    add(f1.part.fix(), mode=Mode.REPLACE)


with BuildPart() as f10:
    # F9 (on Right) → F10 (new body)
    with BuildSketch(Plane.YZ):
        Polygon((-27.2502614573, 0), (-37.2502614573, 0), (-37.2502614573, 3.4), (-34.2250296303, 3.4), (-34.2250296303, 6.6), (-39.2250296303, 6.6), (-39.2250296303, 86.6), (37.7749703697, 86.6), (37.7749703697, 6.6), (32.7749703697, 6.6), (32.7749703697, 3.4), (37.7749703697, 3.4), (37.7749703697, 0), (27.7749703697, 0), (27.7749703697, -3.2), (40.9749703697, -3.2), (40.9749703697, 89.8), (-42.4250296303, 89.8), (-42.4250296303, -3.2), (-27.2502614573, -3.2), align=None)
    extrude(amount=F10_DEPTH)

    # F11 (on face) → F12 (cut)
    with BuildSketch(Plane.XY.offset(89.8)):
        with Locations((9.4750071671, -16.2250296303)):
            Circle(F11_R)
        with Locations((24.9750071671, -0.7250296303)):
            Circle(F11_R_2)
        with Locations((9.4750071671, 14.7749703697)):
            Circle(F11_R)
        with Locations((40.4750071671, 14.7749703697)):
            Circle(F11_R)
        with Locations((40.4750071671, -16.2250296303)):
            Circle(F11_R)
    extrude(amount=-F12_DEPTH, mode=Mode.SUBTRACT)

    # F13
    f13_edges = [f10.edges().sort_by_distance(p)[0] for p in [
        (25, 40.97497, -3.2),
        (25, -42.42503, -3.2),
        (25, 40.97497, 89.8),
        (25, -42.42503, 89.8),
    ]]
    fillet(f13_edges, radius=F13_R)


solid = Compound([f1.part, f10.part])
